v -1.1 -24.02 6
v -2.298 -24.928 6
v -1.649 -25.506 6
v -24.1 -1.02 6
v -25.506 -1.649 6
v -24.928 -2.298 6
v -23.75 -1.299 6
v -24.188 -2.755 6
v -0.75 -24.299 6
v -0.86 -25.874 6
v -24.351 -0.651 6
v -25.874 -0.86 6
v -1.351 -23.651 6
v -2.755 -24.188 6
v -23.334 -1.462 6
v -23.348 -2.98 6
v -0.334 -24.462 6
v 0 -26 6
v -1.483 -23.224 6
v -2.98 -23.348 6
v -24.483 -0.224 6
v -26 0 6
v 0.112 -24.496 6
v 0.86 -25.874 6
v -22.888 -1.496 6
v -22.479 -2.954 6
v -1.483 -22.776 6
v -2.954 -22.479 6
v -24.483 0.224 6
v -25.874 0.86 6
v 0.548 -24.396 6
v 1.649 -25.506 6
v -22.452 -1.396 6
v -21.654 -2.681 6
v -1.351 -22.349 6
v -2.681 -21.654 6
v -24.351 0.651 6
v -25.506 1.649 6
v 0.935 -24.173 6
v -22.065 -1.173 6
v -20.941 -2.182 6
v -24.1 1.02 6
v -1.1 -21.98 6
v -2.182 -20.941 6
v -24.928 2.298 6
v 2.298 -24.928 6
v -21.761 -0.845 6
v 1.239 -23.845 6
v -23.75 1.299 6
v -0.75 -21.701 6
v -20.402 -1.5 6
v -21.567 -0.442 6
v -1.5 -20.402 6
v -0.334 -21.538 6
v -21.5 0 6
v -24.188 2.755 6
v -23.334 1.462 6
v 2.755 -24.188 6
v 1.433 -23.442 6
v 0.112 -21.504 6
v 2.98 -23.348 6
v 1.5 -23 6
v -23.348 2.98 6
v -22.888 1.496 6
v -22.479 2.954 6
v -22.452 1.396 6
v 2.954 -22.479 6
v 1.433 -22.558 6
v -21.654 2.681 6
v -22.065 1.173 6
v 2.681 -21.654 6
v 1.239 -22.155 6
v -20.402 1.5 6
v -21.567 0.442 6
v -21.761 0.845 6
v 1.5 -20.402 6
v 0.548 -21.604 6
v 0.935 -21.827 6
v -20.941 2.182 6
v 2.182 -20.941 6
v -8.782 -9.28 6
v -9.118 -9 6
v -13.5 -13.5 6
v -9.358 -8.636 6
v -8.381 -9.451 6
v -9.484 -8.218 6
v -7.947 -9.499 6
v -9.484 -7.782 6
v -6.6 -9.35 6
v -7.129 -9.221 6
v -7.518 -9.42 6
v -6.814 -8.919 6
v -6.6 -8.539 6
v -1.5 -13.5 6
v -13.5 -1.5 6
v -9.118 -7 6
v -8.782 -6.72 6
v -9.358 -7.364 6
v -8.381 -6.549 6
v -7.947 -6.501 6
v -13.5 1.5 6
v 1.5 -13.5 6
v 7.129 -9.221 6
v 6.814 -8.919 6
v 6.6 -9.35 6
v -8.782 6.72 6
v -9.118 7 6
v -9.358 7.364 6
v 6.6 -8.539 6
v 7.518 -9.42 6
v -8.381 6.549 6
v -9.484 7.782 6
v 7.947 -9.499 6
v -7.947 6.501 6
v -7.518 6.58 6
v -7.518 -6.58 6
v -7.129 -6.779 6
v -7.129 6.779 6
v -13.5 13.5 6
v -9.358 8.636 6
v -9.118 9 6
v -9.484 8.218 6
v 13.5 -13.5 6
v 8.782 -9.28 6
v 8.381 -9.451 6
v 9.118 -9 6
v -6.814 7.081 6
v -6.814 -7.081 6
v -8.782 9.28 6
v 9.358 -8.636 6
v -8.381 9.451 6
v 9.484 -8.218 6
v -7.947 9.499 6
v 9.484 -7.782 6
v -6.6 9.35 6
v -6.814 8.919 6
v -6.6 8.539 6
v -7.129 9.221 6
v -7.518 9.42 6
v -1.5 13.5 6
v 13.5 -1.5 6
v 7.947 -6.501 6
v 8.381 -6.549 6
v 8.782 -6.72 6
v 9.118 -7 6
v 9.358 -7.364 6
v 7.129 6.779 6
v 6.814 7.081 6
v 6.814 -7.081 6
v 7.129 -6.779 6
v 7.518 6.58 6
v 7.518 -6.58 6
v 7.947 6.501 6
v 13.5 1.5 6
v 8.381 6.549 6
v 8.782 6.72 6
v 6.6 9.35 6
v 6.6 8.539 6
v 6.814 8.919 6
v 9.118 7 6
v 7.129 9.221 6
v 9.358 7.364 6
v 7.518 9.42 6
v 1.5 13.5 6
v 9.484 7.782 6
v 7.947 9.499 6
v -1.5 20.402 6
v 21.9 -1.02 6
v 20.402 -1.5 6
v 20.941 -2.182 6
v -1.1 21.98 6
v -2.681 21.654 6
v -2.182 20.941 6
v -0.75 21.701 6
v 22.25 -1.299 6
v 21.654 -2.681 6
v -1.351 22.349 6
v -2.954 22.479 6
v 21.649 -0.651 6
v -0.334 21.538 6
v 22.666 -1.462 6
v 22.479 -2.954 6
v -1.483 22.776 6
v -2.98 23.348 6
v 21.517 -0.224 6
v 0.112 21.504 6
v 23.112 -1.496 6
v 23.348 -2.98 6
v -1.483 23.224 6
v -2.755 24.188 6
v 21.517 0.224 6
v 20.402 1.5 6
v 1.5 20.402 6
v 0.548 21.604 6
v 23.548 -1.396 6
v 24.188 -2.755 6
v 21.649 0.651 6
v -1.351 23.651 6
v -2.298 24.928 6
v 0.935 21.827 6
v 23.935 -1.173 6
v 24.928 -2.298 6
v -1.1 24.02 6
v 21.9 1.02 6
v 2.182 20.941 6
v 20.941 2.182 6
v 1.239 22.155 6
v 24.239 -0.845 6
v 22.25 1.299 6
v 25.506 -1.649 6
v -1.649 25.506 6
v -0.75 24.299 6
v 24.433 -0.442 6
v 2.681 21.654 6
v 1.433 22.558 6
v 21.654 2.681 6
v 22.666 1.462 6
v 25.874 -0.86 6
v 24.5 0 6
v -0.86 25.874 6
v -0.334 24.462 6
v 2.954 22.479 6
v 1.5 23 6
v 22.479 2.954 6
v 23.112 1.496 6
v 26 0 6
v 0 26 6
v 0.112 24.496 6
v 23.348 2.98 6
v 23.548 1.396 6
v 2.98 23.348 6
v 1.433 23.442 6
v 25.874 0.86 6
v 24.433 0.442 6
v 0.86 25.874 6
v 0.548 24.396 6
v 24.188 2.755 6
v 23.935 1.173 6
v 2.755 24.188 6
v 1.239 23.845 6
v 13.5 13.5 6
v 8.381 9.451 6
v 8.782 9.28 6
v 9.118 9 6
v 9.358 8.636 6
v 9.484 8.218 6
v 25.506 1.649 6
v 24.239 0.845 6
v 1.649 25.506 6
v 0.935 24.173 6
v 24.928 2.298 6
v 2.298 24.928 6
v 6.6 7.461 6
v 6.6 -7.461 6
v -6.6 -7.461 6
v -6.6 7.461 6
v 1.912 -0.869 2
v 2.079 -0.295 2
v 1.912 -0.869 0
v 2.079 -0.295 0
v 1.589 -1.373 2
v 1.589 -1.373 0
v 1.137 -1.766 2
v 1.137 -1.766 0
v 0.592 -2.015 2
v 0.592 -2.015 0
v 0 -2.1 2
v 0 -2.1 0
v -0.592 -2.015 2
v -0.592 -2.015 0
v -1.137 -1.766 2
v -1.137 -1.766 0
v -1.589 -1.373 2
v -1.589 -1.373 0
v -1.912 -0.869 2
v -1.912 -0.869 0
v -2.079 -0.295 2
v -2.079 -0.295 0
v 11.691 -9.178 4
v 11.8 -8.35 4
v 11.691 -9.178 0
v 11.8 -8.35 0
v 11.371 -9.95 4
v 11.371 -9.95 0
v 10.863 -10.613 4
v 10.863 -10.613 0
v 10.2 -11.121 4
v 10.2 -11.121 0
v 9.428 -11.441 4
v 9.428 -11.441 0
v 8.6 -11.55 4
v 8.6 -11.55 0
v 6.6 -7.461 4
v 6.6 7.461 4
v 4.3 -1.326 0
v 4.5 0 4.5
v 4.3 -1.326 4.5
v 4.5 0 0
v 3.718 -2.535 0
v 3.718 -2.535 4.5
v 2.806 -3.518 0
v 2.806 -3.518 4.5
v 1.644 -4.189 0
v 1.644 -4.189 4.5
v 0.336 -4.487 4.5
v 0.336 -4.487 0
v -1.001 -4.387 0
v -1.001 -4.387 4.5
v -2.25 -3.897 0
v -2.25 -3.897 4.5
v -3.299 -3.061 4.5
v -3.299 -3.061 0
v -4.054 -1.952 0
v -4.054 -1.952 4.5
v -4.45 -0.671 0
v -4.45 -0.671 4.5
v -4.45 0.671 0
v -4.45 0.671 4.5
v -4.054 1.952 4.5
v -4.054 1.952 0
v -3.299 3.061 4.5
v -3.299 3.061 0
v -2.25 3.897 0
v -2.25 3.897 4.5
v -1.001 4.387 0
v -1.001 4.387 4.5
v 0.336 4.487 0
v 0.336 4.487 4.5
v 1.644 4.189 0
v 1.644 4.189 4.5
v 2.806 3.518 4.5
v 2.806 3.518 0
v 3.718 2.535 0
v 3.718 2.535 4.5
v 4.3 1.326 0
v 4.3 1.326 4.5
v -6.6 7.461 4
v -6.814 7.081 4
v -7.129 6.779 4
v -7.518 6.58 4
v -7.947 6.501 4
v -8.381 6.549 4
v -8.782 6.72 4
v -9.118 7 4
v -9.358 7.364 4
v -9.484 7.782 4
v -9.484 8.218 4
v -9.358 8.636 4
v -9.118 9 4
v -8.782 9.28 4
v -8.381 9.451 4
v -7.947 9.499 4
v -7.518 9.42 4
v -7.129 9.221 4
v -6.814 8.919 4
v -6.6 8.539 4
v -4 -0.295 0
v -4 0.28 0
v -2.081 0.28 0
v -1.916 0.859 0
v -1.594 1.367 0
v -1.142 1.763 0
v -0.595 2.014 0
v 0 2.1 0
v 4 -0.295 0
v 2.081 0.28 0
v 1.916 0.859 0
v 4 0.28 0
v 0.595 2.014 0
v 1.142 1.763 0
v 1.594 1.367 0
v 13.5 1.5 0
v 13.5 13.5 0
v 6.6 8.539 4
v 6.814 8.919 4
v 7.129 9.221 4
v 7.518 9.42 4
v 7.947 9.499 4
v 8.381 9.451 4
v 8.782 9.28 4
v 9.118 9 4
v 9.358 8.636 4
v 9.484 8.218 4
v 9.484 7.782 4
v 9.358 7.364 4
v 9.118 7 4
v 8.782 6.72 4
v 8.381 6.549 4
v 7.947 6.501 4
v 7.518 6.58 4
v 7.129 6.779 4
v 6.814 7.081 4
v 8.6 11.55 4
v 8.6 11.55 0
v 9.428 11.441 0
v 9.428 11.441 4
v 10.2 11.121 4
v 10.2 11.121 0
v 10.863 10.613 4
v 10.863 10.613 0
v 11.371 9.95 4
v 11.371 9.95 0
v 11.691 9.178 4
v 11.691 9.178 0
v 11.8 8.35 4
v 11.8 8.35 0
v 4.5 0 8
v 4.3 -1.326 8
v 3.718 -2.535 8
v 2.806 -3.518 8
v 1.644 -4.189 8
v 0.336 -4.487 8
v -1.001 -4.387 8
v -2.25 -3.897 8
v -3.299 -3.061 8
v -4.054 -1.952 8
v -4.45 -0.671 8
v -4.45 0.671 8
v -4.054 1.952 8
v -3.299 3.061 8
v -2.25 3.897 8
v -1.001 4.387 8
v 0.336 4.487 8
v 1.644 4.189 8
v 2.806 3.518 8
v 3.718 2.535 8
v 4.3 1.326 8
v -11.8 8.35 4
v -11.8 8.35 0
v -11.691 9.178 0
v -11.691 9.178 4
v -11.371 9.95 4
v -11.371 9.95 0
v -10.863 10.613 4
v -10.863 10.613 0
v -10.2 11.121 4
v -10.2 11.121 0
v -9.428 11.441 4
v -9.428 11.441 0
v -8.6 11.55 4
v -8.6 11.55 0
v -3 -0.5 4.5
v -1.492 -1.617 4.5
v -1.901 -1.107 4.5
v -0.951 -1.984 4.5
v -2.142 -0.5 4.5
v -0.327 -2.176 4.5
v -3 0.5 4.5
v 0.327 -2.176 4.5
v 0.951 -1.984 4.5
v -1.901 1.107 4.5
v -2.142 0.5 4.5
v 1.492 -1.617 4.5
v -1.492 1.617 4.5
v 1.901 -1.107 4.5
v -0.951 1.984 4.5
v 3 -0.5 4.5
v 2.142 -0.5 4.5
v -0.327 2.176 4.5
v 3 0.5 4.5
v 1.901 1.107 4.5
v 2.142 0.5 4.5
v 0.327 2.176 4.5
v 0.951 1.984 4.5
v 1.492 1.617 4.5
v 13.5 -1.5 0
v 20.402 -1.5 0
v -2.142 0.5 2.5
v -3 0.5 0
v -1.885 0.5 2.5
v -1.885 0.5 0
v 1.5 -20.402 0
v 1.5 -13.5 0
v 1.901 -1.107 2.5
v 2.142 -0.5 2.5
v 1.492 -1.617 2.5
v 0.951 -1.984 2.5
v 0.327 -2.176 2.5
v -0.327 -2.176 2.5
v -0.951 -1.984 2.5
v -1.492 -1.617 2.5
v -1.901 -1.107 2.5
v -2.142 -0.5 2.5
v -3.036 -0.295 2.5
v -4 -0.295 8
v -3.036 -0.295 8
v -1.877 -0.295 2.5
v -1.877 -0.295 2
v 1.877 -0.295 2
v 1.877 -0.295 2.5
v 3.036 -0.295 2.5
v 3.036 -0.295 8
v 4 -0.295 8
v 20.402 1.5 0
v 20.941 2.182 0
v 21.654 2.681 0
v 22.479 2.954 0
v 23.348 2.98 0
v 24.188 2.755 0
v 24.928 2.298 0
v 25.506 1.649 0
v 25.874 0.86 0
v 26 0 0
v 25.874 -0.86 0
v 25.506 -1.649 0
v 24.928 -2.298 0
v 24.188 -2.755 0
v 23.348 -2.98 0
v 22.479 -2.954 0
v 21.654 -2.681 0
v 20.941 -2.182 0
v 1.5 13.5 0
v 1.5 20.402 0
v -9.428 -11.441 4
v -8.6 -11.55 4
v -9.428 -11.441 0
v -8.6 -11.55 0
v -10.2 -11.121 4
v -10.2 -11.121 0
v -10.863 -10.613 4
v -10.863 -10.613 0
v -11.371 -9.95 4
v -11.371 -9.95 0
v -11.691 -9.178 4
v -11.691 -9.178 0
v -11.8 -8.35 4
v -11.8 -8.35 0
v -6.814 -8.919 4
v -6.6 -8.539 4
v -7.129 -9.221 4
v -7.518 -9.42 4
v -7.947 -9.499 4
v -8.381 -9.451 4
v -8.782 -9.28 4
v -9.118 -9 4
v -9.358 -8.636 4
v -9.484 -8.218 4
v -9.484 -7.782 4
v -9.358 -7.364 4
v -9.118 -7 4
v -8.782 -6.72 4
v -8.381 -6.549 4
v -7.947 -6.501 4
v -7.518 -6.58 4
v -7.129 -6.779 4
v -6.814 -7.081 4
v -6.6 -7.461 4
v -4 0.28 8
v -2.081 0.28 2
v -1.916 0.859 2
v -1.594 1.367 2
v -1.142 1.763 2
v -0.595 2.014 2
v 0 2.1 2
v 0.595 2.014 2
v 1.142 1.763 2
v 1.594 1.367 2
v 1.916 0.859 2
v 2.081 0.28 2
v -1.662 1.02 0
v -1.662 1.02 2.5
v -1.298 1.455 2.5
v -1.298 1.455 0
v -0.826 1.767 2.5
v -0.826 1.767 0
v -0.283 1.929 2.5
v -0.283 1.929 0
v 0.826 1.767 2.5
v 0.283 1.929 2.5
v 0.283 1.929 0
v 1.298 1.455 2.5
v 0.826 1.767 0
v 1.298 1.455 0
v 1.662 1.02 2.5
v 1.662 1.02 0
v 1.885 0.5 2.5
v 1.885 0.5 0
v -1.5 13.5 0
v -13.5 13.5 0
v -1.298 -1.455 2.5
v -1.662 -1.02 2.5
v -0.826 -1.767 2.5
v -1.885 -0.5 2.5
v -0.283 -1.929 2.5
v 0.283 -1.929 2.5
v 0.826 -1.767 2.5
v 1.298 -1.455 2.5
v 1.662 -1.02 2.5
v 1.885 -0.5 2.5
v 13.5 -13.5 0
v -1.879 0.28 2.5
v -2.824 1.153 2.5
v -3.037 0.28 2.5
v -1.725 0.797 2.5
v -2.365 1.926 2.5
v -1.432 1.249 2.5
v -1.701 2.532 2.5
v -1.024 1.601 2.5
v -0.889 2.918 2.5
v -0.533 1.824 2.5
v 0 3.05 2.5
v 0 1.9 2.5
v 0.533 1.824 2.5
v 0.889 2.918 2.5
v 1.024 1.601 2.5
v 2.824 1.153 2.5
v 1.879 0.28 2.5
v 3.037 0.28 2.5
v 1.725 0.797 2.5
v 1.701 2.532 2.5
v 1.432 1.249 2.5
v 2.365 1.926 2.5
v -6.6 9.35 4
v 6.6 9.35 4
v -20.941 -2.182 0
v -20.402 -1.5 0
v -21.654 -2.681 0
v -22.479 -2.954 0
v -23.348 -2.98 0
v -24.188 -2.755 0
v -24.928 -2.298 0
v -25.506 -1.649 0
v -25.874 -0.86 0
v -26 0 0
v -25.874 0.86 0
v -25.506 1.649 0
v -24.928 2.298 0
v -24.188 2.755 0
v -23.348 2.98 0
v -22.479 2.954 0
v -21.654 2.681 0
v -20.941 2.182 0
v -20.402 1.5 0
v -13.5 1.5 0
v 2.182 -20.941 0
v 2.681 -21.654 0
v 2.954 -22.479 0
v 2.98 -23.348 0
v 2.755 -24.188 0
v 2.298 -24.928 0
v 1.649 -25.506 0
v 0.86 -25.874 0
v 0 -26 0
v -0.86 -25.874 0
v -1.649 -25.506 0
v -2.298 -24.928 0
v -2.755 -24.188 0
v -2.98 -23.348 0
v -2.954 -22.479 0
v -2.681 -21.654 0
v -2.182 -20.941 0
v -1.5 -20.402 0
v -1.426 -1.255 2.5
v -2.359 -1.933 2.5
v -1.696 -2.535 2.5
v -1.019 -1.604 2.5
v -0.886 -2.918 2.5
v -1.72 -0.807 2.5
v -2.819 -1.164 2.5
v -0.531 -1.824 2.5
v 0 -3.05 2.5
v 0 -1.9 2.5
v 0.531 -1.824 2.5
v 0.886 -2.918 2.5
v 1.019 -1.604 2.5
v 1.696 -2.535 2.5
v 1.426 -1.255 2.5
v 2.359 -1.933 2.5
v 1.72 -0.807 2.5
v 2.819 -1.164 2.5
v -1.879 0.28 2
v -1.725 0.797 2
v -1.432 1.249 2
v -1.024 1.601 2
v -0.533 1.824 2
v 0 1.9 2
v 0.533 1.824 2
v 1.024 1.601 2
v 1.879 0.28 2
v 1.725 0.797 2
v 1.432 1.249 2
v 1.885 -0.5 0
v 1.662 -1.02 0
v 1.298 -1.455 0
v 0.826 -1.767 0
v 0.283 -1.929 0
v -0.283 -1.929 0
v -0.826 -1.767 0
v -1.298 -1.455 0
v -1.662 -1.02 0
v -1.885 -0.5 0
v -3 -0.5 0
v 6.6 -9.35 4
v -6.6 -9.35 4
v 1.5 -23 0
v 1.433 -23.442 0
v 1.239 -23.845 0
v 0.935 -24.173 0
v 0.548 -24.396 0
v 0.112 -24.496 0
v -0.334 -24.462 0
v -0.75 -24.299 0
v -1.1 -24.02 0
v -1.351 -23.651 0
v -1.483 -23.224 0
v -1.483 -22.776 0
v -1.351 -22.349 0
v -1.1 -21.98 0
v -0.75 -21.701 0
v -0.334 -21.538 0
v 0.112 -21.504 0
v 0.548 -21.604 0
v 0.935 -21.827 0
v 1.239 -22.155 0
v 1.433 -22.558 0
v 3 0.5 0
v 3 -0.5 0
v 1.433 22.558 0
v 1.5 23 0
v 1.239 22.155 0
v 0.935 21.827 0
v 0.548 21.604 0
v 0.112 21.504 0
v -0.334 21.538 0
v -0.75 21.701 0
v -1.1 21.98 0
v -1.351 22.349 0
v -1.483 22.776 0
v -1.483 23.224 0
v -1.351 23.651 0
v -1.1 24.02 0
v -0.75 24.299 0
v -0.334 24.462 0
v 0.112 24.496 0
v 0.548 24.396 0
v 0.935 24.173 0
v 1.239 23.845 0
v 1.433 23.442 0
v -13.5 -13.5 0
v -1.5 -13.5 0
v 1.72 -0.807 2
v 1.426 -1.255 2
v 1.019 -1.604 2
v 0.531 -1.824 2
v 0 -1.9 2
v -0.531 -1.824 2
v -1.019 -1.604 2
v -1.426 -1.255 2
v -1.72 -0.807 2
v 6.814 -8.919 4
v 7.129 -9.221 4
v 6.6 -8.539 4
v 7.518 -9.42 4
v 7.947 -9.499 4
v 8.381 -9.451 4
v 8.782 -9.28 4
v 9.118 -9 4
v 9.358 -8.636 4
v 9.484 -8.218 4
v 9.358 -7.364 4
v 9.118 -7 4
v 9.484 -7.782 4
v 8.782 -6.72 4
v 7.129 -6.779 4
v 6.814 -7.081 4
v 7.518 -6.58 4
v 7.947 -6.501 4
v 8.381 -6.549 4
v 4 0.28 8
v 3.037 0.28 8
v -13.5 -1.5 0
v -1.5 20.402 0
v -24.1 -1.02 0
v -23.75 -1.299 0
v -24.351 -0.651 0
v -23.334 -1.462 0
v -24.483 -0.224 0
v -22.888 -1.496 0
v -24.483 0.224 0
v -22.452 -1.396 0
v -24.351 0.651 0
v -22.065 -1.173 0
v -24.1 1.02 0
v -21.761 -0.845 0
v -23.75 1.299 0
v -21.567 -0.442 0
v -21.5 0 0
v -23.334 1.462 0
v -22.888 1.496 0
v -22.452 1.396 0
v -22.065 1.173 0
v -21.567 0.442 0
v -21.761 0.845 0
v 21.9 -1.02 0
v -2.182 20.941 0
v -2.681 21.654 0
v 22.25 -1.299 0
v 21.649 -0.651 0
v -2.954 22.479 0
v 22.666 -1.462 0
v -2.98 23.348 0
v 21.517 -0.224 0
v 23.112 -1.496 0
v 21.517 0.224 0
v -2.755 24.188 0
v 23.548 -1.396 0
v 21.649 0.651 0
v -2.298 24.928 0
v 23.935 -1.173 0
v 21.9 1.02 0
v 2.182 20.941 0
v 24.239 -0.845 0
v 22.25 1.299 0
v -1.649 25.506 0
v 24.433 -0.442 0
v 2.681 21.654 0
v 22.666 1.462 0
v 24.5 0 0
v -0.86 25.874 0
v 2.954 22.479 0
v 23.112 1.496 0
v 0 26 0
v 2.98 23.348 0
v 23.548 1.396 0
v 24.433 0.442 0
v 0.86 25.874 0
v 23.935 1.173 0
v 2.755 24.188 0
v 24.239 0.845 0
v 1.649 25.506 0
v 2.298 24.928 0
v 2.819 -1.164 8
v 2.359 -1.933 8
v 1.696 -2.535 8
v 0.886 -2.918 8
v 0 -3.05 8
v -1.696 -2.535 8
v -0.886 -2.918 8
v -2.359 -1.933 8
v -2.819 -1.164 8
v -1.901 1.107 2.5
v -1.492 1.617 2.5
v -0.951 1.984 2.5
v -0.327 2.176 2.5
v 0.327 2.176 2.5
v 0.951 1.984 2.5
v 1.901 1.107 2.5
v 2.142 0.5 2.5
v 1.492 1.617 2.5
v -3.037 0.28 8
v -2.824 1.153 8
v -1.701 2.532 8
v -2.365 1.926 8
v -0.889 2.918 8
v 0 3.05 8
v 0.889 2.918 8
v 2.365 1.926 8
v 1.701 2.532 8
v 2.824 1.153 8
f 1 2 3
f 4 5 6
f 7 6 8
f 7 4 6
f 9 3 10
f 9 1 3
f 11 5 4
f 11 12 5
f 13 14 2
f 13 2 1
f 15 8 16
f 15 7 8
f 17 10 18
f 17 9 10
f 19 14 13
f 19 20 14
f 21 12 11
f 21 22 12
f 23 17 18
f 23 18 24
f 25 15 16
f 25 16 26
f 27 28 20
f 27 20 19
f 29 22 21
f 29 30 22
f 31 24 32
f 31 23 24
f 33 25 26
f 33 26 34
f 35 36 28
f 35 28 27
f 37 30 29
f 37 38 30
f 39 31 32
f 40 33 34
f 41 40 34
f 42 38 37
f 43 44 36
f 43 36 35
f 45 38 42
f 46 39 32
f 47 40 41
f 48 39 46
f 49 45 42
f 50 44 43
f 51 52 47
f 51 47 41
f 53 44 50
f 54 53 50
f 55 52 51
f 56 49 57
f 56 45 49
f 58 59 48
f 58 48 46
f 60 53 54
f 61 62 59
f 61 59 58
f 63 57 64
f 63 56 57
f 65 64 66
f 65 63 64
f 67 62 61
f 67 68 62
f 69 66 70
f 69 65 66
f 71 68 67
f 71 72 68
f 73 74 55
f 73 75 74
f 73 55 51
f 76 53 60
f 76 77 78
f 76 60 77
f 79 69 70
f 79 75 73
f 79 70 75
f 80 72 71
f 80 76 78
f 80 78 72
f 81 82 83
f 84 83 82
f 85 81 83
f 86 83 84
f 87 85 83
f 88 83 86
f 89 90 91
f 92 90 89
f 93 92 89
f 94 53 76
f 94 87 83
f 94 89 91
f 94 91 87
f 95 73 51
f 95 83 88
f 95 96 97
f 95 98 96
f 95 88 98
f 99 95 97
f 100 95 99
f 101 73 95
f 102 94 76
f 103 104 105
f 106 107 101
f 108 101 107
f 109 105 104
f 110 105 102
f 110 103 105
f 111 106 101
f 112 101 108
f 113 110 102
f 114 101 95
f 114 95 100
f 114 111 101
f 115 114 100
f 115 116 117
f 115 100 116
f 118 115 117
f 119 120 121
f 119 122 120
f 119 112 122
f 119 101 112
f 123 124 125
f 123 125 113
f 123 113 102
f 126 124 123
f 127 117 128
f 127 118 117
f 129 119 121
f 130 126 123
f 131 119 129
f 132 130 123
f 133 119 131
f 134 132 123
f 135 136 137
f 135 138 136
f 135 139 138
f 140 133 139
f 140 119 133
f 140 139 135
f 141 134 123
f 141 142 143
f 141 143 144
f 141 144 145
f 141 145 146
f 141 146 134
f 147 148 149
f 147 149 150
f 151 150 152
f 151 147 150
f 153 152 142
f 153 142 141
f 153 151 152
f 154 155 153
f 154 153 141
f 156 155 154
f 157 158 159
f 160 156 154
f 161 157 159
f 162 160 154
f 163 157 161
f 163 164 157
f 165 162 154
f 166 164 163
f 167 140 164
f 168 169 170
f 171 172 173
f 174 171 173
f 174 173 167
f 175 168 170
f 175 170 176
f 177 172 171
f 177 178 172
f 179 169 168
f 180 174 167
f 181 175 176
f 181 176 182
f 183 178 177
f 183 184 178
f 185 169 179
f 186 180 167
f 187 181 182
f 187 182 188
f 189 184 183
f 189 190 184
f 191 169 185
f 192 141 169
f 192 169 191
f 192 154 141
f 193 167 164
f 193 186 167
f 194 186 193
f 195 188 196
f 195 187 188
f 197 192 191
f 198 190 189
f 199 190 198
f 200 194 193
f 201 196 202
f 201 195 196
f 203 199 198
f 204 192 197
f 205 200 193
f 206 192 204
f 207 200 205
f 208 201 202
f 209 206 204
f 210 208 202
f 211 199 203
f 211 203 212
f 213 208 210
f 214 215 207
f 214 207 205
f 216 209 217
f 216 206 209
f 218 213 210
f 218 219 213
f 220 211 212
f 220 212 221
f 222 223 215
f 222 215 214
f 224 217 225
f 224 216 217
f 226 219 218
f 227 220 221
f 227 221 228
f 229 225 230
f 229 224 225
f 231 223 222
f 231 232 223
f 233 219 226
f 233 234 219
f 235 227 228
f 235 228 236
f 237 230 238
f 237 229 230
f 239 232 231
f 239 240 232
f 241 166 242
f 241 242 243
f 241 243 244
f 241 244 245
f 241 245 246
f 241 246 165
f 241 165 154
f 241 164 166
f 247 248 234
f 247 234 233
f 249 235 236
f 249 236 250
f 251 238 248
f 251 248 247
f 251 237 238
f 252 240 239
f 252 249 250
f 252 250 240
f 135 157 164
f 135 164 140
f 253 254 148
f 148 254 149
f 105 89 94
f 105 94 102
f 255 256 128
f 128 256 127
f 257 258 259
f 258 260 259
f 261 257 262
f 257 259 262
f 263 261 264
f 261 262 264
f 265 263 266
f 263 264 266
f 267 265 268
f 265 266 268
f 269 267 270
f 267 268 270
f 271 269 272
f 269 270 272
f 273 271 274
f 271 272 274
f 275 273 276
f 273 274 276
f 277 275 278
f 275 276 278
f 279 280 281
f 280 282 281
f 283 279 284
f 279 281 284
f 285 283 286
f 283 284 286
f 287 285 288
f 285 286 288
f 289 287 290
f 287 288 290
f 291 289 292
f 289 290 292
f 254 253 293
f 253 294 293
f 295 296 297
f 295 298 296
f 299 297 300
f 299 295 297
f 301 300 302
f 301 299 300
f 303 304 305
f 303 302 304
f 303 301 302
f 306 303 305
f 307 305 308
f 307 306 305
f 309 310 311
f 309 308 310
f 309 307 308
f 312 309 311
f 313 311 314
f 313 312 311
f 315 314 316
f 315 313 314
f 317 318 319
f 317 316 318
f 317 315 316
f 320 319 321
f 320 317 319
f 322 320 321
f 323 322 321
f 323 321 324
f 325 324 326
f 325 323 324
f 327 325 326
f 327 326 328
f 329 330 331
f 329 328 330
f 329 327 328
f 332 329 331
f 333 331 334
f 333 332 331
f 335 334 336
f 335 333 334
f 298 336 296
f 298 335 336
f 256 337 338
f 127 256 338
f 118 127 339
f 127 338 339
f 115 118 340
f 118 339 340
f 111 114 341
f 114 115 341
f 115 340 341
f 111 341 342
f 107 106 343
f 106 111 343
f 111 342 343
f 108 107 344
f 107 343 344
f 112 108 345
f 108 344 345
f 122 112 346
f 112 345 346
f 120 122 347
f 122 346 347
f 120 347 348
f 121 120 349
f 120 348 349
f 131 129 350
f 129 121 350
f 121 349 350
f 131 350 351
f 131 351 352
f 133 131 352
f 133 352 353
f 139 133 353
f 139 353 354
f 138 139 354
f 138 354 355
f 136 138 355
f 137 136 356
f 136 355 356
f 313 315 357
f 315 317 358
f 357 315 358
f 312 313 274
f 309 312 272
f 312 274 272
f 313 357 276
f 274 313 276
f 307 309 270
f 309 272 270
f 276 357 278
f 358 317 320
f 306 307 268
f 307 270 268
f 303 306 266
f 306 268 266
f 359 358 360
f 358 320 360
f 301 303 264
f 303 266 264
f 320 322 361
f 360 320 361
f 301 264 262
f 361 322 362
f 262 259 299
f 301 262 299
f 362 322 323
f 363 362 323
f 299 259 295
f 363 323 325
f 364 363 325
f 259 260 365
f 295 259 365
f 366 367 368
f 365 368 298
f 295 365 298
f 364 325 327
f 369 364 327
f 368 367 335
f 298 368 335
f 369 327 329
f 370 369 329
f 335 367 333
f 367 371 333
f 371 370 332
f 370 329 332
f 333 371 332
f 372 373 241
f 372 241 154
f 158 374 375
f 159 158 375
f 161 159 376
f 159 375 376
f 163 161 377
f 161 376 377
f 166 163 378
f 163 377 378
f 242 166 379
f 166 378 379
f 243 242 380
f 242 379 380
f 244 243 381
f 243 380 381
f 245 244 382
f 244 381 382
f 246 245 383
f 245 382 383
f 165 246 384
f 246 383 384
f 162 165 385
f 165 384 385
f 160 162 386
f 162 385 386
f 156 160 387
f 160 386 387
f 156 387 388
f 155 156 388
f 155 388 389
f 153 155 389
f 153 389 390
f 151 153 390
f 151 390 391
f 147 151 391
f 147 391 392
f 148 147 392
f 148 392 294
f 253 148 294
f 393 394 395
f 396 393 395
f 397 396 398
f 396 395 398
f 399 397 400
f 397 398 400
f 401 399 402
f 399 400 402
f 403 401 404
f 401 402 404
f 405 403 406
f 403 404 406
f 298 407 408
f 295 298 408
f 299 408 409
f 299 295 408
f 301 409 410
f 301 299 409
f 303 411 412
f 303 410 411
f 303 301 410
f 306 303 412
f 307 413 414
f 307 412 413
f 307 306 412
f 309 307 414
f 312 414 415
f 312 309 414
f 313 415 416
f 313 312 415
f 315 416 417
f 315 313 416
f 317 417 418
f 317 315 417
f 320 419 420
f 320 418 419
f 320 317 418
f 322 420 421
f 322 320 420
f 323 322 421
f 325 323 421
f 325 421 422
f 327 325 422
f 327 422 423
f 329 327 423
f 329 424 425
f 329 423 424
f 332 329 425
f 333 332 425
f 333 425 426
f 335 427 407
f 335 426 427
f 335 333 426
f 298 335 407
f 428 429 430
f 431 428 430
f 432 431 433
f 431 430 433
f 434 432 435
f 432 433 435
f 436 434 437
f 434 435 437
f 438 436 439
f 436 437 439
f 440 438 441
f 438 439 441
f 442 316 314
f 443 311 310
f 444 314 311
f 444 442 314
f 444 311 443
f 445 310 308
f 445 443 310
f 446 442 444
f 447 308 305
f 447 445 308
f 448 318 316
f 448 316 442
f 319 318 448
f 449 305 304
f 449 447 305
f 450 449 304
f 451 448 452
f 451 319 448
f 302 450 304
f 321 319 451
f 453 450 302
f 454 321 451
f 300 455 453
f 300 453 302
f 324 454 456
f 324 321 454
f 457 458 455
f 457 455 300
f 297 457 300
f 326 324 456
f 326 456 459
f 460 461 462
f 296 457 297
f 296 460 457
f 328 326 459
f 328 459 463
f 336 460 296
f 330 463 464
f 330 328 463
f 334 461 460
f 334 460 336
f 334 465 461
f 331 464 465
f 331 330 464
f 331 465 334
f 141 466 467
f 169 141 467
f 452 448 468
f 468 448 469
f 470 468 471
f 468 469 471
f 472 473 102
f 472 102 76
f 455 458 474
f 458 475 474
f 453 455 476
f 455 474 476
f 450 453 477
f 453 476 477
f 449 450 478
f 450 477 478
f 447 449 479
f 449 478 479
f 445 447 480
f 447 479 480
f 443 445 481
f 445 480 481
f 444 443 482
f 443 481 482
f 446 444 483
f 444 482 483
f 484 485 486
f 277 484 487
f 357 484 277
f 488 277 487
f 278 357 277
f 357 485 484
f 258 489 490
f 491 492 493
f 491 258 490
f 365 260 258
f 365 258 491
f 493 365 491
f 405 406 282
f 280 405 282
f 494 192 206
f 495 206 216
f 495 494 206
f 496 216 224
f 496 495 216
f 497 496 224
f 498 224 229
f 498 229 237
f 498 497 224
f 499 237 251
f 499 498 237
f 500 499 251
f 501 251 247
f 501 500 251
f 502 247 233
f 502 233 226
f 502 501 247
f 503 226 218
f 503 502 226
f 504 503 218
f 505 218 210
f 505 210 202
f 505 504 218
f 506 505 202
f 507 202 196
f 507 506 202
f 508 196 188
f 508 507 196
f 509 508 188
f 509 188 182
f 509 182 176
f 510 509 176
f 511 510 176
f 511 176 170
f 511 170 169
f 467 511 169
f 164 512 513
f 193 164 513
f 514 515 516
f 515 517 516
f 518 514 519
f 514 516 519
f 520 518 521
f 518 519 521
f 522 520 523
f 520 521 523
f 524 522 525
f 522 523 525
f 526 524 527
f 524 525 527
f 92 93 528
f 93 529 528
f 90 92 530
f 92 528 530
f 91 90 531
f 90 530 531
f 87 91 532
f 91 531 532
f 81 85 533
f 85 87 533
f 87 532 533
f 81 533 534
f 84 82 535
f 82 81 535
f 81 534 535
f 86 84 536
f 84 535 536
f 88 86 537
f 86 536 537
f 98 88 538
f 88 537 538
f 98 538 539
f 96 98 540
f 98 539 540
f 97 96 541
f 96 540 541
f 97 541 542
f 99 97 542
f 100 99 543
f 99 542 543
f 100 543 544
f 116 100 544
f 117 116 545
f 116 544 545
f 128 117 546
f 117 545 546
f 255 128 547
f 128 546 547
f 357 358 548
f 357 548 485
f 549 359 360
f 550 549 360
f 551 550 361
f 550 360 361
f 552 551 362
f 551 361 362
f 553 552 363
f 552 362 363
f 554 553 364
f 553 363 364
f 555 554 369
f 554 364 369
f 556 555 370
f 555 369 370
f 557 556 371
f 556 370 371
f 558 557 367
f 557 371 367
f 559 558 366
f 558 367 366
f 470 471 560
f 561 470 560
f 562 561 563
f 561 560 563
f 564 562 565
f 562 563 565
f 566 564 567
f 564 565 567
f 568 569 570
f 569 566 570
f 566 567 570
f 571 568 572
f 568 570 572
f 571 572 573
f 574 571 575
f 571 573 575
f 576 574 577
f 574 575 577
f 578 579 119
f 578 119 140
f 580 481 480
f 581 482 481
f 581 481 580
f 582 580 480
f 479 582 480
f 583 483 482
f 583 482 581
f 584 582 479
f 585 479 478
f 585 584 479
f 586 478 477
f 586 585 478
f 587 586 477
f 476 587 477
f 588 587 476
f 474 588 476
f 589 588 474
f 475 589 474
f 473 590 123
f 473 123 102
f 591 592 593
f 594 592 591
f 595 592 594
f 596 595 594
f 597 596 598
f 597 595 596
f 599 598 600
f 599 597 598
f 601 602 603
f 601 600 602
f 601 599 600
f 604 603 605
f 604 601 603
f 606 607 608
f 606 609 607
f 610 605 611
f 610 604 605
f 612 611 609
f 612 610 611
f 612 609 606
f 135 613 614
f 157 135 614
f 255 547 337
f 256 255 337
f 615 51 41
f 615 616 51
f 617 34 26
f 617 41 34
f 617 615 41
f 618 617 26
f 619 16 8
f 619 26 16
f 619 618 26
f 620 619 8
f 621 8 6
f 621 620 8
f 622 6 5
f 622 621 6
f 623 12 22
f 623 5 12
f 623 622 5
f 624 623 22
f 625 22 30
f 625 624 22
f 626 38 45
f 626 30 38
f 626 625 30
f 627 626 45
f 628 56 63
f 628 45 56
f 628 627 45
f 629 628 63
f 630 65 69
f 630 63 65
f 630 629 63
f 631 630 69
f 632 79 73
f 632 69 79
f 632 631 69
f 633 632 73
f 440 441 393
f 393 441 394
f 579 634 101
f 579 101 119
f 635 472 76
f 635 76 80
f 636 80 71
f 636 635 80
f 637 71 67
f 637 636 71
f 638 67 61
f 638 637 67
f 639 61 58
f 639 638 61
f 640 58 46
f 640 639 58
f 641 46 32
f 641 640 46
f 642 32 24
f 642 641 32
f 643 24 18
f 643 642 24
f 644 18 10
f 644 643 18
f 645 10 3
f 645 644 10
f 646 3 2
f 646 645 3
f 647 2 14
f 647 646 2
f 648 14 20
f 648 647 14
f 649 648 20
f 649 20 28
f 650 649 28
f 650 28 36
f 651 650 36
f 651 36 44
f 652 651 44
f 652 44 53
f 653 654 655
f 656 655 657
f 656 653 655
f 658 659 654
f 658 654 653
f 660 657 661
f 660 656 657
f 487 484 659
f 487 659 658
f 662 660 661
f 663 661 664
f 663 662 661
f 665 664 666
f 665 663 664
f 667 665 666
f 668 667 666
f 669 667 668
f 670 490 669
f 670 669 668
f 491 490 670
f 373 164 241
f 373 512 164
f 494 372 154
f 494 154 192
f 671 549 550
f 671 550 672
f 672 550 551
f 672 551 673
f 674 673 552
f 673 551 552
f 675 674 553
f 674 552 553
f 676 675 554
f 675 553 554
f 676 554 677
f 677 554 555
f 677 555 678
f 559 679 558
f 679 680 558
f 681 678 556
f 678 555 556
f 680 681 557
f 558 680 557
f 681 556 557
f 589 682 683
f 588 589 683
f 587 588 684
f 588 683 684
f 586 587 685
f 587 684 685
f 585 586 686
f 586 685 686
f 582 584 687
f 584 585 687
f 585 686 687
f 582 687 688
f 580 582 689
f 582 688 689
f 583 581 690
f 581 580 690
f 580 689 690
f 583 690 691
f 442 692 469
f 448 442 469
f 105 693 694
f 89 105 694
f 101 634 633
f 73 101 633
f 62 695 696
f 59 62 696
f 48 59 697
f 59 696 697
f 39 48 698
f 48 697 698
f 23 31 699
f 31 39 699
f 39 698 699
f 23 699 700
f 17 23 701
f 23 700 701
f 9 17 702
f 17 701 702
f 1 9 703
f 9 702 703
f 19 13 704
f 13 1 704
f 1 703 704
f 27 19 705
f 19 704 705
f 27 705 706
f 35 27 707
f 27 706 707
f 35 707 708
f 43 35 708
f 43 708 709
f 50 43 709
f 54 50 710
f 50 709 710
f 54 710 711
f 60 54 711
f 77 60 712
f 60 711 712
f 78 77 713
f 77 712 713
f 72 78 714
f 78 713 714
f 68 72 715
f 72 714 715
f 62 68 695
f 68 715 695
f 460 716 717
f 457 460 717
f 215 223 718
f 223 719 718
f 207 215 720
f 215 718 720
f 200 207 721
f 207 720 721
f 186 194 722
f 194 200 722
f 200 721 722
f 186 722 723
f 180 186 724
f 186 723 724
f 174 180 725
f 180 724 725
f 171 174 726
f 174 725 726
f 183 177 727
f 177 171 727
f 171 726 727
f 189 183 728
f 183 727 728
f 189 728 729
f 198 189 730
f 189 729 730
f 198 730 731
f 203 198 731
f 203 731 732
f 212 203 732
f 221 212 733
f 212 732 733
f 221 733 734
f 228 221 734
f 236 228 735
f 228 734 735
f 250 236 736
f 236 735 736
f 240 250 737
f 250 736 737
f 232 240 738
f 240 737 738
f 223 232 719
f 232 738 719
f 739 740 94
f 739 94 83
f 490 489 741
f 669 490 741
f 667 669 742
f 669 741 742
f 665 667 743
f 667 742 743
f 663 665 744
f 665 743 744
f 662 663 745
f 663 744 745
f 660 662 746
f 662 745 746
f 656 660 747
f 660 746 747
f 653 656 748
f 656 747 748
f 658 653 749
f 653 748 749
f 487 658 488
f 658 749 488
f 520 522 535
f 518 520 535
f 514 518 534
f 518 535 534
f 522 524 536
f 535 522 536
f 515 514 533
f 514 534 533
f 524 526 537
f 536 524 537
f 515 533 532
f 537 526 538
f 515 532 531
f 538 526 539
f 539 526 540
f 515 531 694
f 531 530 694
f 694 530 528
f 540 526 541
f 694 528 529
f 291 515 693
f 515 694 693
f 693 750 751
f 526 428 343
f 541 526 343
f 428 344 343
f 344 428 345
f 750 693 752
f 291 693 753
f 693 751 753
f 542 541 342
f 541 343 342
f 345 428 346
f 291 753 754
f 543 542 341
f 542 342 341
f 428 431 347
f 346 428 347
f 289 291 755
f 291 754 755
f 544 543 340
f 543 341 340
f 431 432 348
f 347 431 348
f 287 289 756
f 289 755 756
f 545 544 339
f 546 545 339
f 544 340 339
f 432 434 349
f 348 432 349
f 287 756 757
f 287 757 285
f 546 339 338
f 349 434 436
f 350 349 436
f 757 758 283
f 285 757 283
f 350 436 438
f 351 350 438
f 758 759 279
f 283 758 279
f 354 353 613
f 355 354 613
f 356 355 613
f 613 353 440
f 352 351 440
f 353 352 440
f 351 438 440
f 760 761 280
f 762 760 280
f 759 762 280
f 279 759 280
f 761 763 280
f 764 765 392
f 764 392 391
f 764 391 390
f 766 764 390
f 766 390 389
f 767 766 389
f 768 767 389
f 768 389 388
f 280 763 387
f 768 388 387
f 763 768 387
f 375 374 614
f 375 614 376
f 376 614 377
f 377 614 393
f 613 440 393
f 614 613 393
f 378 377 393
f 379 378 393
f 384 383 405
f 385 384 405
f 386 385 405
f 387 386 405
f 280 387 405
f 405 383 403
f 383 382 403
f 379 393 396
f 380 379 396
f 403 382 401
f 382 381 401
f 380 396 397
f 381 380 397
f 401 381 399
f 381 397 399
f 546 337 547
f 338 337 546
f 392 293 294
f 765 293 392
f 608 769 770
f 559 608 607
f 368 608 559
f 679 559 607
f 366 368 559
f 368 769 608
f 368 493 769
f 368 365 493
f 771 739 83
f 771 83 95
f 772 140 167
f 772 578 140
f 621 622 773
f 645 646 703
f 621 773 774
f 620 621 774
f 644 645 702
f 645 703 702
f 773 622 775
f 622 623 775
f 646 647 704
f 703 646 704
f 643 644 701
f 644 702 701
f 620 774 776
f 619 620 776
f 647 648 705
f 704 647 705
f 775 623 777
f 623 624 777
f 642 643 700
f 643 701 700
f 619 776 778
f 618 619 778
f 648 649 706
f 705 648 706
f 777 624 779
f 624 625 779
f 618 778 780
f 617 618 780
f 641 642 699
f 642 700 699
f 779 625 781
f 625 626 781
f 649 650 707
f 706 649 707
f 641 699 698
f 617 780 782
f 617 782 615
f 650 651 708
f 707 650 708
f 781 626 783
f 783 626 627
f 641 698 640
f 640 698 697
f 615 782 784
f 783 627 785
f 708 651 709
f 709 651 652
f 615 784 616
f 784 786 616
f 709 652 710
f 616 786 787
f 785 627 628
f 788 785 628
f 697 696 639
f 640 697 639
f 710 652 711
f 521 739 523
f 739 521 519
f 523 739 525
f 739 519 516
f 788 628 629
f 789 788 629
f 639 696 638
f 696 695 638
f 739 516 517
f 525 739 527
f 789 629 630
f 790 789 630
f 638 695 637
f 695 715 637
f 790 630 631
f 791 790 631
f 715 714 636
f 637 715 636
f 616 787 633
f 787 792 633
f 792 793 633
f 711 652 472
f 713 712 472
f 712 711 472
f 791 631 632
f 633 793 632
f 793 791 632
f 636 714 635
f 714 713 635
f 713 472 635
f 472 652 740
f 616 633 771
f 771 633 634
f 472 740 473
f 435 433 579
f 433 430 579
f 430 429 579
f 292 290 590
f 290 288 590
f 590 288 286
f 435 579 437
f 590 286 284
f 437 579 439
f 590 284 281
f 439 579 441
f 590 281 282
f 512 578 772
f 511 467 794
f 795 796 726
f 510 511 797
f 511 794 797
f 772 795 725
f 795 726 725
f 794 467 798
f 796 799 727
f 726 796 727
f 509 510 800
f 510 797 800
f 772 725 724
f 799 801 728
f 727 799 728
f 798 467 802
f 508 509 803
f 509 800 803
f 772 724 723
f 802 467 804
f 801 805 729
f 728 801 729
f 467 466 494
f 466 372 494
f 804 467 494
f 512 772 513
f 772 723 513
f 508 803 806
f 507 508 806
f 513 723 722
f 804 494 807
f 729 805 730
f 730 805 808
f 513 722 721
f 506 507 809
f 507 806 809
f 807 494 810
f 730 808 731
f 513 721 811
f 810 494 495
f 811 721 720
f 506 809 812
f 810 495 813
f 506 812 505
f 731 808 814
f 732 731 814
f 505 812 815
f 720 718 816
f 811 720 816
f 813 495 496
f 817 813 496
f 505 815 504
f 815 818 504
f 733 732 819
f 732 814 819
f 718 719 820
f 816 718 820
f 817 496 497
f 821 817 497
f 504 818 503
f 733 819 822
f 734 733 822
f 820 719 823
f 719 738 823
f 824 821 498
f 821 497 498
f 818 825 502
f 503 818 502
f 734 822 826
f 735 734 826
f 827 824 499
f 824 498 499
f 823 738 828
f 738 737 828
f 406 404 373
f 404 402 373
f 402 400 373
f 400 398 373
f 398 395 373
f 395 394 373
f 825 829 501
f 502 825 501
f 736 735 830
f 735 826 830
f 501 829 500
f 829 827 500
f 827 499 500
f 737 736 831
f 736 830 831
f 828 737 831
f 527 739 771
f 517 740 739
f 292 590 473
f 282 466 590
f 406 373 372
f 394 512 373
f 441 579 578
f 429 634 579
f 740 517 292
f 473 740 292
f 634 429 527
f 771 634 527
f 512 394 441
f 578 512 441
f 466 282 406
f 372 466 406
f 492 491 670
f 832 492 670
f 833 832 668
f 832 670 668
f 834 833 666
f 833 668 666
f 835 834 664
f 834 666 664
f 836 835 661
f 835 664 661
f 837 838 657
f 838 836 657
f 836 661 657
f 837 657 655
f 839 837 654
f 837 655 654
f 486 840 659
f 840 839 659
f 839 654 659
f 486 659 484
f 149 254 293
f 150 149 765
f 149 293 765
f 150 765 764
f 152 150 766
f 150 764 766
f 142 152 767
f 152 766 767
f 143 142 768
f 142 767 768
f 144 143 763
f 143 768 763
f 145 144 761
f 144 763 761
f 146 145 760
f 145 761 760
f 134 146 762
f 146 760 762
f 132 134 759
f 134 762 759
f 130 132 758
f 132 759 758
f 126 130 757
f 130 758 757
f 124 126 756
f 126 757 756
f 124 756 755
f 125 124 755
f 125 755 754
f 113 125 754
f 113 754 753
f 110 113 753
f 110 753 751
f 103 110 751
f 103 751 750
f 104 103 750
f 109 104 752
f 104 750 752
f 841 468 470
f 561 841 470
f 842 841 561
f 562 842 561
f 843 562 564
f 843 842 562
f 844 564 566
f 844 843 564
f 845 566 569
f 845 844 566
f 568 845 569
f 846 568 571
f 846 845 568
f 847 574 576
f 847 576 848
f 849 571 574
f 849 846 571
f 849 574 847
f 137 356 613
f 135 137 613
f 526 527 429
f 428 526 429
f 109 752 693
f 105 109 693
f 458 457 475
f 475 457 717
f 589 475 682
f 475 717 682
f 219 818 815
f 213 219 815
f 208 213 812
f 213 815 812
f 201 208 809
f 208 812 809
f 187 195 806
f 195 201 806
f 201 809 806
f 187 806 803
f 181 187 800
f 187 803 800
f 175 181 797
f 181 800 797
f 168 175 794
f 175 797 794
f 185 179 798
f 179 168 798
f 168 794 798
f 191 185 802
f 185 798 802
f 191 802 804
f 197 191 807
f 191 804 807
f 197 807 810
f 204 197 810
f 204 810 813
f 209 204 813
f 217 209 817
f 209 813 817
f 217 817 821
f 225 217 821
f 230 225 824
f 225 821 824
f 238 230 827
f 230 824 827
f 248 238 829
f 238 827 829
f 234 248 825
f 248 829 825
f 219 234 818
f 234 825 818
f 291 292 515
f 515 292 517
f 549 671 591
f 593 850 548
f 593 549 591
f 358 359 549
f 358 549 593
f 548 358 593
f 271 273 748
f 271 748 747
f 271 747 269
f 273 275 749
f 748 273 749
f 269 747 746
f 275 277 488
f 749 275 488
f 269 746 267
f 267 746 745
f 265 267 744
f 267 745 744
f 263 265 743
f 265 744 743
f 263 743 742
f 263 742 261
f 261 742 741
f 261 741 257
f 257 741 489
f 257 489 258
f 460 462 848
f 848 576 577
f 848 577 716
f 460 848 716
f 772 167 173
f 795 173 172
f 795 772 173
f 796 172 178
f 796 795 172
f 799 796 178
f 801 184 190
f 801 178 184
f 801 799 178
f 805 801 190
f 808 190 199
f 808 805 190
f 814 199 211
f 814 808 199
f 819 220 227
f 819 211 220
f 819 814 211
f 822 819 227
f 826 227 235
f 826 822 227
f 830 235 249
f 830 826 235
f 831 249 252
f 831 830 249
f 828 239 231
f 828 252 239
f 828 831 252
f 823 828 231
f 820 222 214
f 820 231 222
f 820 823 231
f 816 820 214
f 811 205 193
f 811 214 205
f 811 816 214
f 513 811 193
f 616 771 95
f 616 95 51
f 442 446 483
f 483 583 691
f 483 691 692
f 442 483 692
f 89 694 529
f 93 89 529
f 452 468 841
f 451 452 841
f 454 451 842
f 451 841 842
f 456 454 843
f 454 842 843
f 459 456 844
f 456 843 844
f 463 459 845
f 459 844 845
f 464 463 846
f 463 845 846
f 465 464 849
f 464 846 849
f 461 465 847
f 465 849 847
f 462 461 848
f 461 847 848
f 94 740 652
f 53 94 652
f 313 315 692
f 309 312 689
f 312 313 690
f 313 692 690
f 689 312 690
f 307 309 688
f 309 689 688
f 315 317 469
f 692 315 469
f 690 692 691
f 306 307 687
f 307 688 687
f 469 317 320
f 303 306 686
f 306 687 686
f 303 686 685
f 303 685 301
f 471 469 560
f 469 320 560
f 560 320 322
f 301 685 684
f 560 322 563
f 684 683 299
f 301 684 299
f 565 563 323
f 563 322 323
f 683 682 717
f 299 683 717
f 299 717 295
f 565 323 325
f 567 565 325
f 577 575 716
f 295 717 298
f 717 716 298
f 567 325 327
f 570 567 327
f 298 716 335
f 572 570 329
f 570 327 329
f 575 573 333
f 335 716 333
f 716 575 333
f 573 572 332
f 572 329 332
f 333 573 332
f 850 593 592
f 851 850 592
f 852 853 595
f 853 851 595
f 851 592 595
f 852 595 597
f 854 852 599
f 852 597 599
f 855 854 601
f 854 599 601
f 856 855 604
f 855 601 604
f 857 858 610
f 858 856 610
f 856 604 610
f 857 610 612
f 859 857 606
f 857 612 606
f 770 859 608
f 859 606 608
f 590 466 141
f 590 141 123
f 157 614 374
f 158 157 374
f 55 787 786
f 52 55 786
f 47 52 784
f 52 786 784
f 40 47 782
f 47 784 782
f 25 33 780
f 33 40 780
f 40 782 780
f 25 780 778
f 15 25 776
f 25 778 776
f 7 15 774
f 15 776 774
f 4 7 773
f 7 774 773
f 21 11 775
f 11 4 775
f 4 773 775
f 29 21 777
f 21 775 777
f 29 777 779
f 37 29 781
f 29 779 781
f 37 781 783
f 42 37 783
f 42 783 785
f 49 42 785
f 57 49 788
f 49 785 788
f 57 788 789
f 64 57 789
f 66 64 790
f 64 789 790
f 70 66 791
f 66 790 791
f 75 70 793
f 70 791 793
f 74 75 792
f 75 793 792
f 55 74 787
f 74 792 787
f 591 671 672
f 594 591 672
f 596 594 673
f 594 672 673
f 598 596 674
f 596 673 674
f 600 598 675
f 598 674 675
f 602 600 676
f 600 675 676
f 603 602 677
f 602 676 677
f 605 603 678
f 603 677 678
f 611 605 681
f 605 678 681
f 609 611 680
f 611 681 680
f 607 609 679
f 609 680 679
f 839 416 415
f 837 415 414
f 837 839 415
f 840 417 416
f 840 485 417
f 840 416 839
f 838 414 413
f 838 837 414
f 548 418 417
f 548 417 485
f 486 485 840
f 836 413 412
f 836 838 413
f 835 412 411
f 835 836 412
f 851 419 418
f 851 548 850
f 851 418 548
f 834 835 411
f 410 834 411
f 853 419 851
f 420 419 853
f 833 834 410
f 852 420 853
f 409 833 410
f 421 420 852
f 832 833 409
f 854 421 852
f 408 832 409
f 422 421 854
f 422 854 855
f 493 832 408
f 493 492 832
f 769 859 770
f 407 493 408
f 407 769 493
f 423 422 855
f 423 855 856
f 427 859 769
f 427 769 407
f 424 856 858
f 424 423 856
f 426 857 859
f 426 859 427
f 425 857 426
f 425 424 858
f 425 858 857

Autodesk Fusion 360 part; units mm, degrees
sketch "AS5600" plane through (0, 0, 0) normal (0, 0, 1) x (1, 0, 0)
  line L0 (-8.6, 11.35) -> (8.6, 11.35)
  line L1 (11.6, 8.35) -> (11.6, -8.35)
  line L2 (8.6, -11.35) -> (-8.6, -11.35)
  line L3 (-11.6, -8.35) -> (-11.6, 8.35)
  line L4 (-8, 8) -> (8, 8) construction
  line L5 (8, 8) -> (8, -8) construction
  line L6 (8, -8) -> (-8, -8) construction
  line L7 (-8, -8) -> (-8, 8) construction
  circle A0 centre (-8, 8) radius 1.5
  circle A1 centre (8, 8) radius 1.5
  circle A2 centre (-8, -8) radius 1.5
  circle A3 centre (8, -8) radius 1.5
  arc A4 (-8.6, 11.35) -> (-11.6, 8.35) centre (-8.6, 8.35) ccw
  arc A5 (11.6, 8.35) -> (8.6, 11.35) centre (8.6, 8.35) ccw
  arc A6 (-11.6, -8.35) -> (-8.6, -11.35) centre (-8.6, -8.35) ccw
  arc A7 (8.6, -11.35) -> (11.6, -8.35) centre (8.6, -8.35) ccw
  point P0 (11.6, 11.35)
  point P1 (11.6, -11.35)
  dimension "d6" = 23.2
  dimension "d7" = 22.7
  dimension "d8" = 11.35
  dimension "d10" = 8
  dimension "d11" = 8
  dimension "d12" = 8
  dimension "d13" = 8
  dimension "d14" = 3
  dimension "d15" = 3
  dimension "d16" = 3
  dimension "d17" = 3
  dimension "d18" = 3
  dimension "d19" = 3
  dimension "d20" = 3
  dimension "d21" = 3
  dimension "d22" = 11.6
sketch "Sketch3" plane through (0, 0, 0) normal (0, 0, 1) x (1, 0, 0)
  circle A0 centre (0, 0) radius 23 construction
  circle A1 centre (23, 0) radius 1.5
  line L0 (0, 0) -> (23, 0) construction
  circle A2 centre (23, 0) radius 3
  line L1 (-13.5, 13.5) -> (13.5, 13.5)
  line L2 (13.5, 13.5) -> (13.5, -13.5)
  line L3 (13.5, -13.5) -> (-13.5, -13.5)
  line L4 (-13.5, -13.5) -> (-13.5, 13.5)
  line L5 (-6.6, 9.35) -> (6.6, 9.35)
  line L6 (6.6, 9.35) -> (6.6, -9.35)
  line L7 (6.6, -9.35) -> (-6.6, -9.35)
  line L8 (-6.6, -9.35) -> (-6.6, 9.35)
  line L9 (-11.6, -8.35) -> (-11.6, 8.35)
  line L10 (11.6, 8.35) -> (11.6, -8.35)
  line L11 (8.6, -11.35) -> (-8.6, -11.35)
  line L12 (-8.6, 11.35) -> (8.6, 11.35)
  line L13 (13.5, 1.5) -> (20.4019, 1.5)
  line L14 (13.5, -1.5) -> (20.4019, -1.5)
  circle A3 centre (0, 23) radius 3
  circle A4 centre (0, 23) radius 1.5
  line L15 (1.5, 13.5) -> (1.5, 20.4019)
  line L16 (-1.5, 13.5) -> (-1.5, 20.4019)
  circle A5 centre (-23, 0) radius 3
  circle A6 centre (-23, 0) radius 1.5
  line L17 (-13.5, 1.5) -> (-20.4019, 1.5)
  line L18 (-13.5, -1.5) -> (-20.4019, -1.5)
  circle A7 centre (0, -23) radius 3
  circle A8 centre (0, -23) radius 1.5
  line L19 (-1.5, -13.5) -> (-1.5, -20.4019)
  line L20 (1.5, -13.5) -> (1.5, -20.4019)
  circle A9 centre (8, 8) radius 1.5
  circle A10 centre (-8, 8) radius 1.5
  circle A11 centre (-8, -8) radius 1.5
  circle A12 centre (8, -8) radius 1.5
  dimension "d23" = 46
  dimension "d24" = 3
  dimension "d25" = 6
  dimension "d26" = 13.5
  dimension "d27" = 13.5
  dimension "d28" = 13.5
  dimension "d29" = 13.5
  dimension "d30" = 5
  dimension "d31" = 5
  dimension "d32" = 2
  dimension "d33" = 2
  dimension "d34" = 1.5
  dimension "d35" = 1.5
  dimension "d37" = 360
extrude "Extrude2" add sketch "Sketch3" along normal blind 6 makes body 1
sketch "Sketch4" plane through (0, 0, 0) normal (0, 0, 1) x (1, 0, 0)
  line L0 (-8.6, 11.35) -> (8.6, 11.35)
  line L1 (-11.6, -8.35) -> (-11.6, 8.35)
  arc A0 (-8.6, 11.35) -> (-11.6, 8.35) centre (-8.6, 8.35) ccw
  arc A1 (-11.6, -8.35) -> (-8.6, -11.35) centre (-8.6, -8.35) ccw
  line L2 (8.6, -11.35) -> (-8.6, -11.35)
  arc A2 (8.6, -11.35) -> (11.6, -8.35) centre (8.6, -8.35) ccw
  line L3 (11.6, 8.35) -> (11.6, -8.35)
  arc A3 (11.6, 8.35) -> (8.6, 11.35) centre (8.6, 8.35) ccw
  arc A4 (8.6, -11.55) -> (11.8, -8.35) centre (8.6, -8.35) ccw
  line L4 (11.8, 8.35) -> (11.8, -8.35)
  arc A5 (11.8, 8.35) -> (8.6, 11.55) centre (8.6, 8.35) ccw
  line L5 (-8.6, 11.55) -> (8.6, 11.55)
  arc A6 (-8.6, 11.55) -> (-11.8, 8.35) centre (-8.6, 8.35) ccw
  line L6 (-11.8, -8.35) -> (-11.8, 8.35)
  arc A7 (-11.8, -8.35) -> (-8.6, -11.55) centre (-8.6, -8.35) ccw
  line L7 (8.6, -11.55) -> (-8.6, -11.55)
  dimension "d42" = -0.2
extrude "Extrude3" cut sketch "Sketch4" along normal blind 4 contours L0 L1 A0 A1 L2 A2 L3 A3 | A4 L4 A5 L5 A6 L6 A7 L7 bodies 1
sketch "Sketch1" plane through (0, 0, 0) normal (0, 0, 1) x (1, 0, 0) in component "MagnetHolder1"
  circle A0 centre (0, 0) radius 2.2
  circle A1 centre (0, 0) radius 4.5
  circle A2 centre (0, 0) radius 1.95
  dimension "d45" = 4.4
  dimension "d46" = 9
  dimension "d47" = 3.9
extrude "Extrude1" add sketch "Sketch1" along normal blind 4.5 separate body contours A1 makes body 2 in component "MagnetHolder1"
extrude "Extrude2'" add sketch "Sketch1" along normal blind 2.5 contours A0 bodies 2 in component "MagnetHolder1"
sketch "Sketch2" plane through (0, 0, 0) normal (0, 0, 1) x (1, 0, 0) in component "MagnetHolder1"
  line L0 (-3, 0.5) -> (3, 0.5)
  line L1 (3, 0.5) -> (3, -0.5)
  line L2 (3, -0.5) -> (-3, -0.5)
  line L3 (-3, -0.5) -> (-3, 0.5)
  dimension "d52" = 3
  dimension "d53" = 3
  dimension "d54" = 0.5
  dimension "d55" = 0.5
extrude "Extrude3'" cut sketch "Sketch2" along normal blind 7.5 bodies 2 in component "MagnetHolder1"
sketch "Sketch1 (2)" plane through (0, 0, 0) normal (0, 0, 1) x (1, 0, 0) in component "MagnetHolder2"
  circle A0 centre (0, 0) radius 3.05
  circle A1 centre (0, 0) radius 2.1
  circle A2 centre (0, 0) radius 4.5
  circle A3 centre (0, 0) radius 1.9
  dimension "d58" = 6.1
  dimension "d59" = 4.2
  dimension "d60" = 9
  dimension "d65" = 3.8
extrude "Extrude1'" add sketch "Sketch1 (2)" along normal blind 8 separate body contours A2 makes body 3 in component "MagnetHolder2"
extrude "Extrude2''" add sketch "Sketch1 (2)" along normal blind 2.5 contours A0 bodies 3 in component "MagnetHolder2"
extrude "Extrude3''" add sketch "Sketch1 (2)" along normal blind 2.5 and the other way blind -2 contours A1 bodies 3 in component "MagnetHolder2"
sketch "Sketch2 (2)" plane through (0, 0, 0) normal (0, 0, 1) x (1, 0, 0) in component "MagnetHolder2"
  line L0 (4, 0.2804) -> (-4, 0.2804)
  line L1 (-4, 0.2804) -> (-4, -0.2948)
  line L2 (-4, -0.2948) -> (4, -0.2948)
  line L3 (4, -0.2948) -> (4, 0.2804)
  dimension "d70" = 4
  dimension "d71" = 4
extrude "Extrude4" cut sketch "Sketch2 (2)" along normal blind 9.5 bodies 3 in component "MagnetHolder2"
component "MagnetHolder1" placed x (1, 0, 0) y (0, 1, 0) z (0, 0, 1) at (0, 0, 0)
component "MagnetHolder2" placed x (1, 0, 0) y (0, 1, 0) z (0, 0, 1) at (0, 0, 0)
equation "d8 = ( 22.7 / 2 ) * 1 mm"
